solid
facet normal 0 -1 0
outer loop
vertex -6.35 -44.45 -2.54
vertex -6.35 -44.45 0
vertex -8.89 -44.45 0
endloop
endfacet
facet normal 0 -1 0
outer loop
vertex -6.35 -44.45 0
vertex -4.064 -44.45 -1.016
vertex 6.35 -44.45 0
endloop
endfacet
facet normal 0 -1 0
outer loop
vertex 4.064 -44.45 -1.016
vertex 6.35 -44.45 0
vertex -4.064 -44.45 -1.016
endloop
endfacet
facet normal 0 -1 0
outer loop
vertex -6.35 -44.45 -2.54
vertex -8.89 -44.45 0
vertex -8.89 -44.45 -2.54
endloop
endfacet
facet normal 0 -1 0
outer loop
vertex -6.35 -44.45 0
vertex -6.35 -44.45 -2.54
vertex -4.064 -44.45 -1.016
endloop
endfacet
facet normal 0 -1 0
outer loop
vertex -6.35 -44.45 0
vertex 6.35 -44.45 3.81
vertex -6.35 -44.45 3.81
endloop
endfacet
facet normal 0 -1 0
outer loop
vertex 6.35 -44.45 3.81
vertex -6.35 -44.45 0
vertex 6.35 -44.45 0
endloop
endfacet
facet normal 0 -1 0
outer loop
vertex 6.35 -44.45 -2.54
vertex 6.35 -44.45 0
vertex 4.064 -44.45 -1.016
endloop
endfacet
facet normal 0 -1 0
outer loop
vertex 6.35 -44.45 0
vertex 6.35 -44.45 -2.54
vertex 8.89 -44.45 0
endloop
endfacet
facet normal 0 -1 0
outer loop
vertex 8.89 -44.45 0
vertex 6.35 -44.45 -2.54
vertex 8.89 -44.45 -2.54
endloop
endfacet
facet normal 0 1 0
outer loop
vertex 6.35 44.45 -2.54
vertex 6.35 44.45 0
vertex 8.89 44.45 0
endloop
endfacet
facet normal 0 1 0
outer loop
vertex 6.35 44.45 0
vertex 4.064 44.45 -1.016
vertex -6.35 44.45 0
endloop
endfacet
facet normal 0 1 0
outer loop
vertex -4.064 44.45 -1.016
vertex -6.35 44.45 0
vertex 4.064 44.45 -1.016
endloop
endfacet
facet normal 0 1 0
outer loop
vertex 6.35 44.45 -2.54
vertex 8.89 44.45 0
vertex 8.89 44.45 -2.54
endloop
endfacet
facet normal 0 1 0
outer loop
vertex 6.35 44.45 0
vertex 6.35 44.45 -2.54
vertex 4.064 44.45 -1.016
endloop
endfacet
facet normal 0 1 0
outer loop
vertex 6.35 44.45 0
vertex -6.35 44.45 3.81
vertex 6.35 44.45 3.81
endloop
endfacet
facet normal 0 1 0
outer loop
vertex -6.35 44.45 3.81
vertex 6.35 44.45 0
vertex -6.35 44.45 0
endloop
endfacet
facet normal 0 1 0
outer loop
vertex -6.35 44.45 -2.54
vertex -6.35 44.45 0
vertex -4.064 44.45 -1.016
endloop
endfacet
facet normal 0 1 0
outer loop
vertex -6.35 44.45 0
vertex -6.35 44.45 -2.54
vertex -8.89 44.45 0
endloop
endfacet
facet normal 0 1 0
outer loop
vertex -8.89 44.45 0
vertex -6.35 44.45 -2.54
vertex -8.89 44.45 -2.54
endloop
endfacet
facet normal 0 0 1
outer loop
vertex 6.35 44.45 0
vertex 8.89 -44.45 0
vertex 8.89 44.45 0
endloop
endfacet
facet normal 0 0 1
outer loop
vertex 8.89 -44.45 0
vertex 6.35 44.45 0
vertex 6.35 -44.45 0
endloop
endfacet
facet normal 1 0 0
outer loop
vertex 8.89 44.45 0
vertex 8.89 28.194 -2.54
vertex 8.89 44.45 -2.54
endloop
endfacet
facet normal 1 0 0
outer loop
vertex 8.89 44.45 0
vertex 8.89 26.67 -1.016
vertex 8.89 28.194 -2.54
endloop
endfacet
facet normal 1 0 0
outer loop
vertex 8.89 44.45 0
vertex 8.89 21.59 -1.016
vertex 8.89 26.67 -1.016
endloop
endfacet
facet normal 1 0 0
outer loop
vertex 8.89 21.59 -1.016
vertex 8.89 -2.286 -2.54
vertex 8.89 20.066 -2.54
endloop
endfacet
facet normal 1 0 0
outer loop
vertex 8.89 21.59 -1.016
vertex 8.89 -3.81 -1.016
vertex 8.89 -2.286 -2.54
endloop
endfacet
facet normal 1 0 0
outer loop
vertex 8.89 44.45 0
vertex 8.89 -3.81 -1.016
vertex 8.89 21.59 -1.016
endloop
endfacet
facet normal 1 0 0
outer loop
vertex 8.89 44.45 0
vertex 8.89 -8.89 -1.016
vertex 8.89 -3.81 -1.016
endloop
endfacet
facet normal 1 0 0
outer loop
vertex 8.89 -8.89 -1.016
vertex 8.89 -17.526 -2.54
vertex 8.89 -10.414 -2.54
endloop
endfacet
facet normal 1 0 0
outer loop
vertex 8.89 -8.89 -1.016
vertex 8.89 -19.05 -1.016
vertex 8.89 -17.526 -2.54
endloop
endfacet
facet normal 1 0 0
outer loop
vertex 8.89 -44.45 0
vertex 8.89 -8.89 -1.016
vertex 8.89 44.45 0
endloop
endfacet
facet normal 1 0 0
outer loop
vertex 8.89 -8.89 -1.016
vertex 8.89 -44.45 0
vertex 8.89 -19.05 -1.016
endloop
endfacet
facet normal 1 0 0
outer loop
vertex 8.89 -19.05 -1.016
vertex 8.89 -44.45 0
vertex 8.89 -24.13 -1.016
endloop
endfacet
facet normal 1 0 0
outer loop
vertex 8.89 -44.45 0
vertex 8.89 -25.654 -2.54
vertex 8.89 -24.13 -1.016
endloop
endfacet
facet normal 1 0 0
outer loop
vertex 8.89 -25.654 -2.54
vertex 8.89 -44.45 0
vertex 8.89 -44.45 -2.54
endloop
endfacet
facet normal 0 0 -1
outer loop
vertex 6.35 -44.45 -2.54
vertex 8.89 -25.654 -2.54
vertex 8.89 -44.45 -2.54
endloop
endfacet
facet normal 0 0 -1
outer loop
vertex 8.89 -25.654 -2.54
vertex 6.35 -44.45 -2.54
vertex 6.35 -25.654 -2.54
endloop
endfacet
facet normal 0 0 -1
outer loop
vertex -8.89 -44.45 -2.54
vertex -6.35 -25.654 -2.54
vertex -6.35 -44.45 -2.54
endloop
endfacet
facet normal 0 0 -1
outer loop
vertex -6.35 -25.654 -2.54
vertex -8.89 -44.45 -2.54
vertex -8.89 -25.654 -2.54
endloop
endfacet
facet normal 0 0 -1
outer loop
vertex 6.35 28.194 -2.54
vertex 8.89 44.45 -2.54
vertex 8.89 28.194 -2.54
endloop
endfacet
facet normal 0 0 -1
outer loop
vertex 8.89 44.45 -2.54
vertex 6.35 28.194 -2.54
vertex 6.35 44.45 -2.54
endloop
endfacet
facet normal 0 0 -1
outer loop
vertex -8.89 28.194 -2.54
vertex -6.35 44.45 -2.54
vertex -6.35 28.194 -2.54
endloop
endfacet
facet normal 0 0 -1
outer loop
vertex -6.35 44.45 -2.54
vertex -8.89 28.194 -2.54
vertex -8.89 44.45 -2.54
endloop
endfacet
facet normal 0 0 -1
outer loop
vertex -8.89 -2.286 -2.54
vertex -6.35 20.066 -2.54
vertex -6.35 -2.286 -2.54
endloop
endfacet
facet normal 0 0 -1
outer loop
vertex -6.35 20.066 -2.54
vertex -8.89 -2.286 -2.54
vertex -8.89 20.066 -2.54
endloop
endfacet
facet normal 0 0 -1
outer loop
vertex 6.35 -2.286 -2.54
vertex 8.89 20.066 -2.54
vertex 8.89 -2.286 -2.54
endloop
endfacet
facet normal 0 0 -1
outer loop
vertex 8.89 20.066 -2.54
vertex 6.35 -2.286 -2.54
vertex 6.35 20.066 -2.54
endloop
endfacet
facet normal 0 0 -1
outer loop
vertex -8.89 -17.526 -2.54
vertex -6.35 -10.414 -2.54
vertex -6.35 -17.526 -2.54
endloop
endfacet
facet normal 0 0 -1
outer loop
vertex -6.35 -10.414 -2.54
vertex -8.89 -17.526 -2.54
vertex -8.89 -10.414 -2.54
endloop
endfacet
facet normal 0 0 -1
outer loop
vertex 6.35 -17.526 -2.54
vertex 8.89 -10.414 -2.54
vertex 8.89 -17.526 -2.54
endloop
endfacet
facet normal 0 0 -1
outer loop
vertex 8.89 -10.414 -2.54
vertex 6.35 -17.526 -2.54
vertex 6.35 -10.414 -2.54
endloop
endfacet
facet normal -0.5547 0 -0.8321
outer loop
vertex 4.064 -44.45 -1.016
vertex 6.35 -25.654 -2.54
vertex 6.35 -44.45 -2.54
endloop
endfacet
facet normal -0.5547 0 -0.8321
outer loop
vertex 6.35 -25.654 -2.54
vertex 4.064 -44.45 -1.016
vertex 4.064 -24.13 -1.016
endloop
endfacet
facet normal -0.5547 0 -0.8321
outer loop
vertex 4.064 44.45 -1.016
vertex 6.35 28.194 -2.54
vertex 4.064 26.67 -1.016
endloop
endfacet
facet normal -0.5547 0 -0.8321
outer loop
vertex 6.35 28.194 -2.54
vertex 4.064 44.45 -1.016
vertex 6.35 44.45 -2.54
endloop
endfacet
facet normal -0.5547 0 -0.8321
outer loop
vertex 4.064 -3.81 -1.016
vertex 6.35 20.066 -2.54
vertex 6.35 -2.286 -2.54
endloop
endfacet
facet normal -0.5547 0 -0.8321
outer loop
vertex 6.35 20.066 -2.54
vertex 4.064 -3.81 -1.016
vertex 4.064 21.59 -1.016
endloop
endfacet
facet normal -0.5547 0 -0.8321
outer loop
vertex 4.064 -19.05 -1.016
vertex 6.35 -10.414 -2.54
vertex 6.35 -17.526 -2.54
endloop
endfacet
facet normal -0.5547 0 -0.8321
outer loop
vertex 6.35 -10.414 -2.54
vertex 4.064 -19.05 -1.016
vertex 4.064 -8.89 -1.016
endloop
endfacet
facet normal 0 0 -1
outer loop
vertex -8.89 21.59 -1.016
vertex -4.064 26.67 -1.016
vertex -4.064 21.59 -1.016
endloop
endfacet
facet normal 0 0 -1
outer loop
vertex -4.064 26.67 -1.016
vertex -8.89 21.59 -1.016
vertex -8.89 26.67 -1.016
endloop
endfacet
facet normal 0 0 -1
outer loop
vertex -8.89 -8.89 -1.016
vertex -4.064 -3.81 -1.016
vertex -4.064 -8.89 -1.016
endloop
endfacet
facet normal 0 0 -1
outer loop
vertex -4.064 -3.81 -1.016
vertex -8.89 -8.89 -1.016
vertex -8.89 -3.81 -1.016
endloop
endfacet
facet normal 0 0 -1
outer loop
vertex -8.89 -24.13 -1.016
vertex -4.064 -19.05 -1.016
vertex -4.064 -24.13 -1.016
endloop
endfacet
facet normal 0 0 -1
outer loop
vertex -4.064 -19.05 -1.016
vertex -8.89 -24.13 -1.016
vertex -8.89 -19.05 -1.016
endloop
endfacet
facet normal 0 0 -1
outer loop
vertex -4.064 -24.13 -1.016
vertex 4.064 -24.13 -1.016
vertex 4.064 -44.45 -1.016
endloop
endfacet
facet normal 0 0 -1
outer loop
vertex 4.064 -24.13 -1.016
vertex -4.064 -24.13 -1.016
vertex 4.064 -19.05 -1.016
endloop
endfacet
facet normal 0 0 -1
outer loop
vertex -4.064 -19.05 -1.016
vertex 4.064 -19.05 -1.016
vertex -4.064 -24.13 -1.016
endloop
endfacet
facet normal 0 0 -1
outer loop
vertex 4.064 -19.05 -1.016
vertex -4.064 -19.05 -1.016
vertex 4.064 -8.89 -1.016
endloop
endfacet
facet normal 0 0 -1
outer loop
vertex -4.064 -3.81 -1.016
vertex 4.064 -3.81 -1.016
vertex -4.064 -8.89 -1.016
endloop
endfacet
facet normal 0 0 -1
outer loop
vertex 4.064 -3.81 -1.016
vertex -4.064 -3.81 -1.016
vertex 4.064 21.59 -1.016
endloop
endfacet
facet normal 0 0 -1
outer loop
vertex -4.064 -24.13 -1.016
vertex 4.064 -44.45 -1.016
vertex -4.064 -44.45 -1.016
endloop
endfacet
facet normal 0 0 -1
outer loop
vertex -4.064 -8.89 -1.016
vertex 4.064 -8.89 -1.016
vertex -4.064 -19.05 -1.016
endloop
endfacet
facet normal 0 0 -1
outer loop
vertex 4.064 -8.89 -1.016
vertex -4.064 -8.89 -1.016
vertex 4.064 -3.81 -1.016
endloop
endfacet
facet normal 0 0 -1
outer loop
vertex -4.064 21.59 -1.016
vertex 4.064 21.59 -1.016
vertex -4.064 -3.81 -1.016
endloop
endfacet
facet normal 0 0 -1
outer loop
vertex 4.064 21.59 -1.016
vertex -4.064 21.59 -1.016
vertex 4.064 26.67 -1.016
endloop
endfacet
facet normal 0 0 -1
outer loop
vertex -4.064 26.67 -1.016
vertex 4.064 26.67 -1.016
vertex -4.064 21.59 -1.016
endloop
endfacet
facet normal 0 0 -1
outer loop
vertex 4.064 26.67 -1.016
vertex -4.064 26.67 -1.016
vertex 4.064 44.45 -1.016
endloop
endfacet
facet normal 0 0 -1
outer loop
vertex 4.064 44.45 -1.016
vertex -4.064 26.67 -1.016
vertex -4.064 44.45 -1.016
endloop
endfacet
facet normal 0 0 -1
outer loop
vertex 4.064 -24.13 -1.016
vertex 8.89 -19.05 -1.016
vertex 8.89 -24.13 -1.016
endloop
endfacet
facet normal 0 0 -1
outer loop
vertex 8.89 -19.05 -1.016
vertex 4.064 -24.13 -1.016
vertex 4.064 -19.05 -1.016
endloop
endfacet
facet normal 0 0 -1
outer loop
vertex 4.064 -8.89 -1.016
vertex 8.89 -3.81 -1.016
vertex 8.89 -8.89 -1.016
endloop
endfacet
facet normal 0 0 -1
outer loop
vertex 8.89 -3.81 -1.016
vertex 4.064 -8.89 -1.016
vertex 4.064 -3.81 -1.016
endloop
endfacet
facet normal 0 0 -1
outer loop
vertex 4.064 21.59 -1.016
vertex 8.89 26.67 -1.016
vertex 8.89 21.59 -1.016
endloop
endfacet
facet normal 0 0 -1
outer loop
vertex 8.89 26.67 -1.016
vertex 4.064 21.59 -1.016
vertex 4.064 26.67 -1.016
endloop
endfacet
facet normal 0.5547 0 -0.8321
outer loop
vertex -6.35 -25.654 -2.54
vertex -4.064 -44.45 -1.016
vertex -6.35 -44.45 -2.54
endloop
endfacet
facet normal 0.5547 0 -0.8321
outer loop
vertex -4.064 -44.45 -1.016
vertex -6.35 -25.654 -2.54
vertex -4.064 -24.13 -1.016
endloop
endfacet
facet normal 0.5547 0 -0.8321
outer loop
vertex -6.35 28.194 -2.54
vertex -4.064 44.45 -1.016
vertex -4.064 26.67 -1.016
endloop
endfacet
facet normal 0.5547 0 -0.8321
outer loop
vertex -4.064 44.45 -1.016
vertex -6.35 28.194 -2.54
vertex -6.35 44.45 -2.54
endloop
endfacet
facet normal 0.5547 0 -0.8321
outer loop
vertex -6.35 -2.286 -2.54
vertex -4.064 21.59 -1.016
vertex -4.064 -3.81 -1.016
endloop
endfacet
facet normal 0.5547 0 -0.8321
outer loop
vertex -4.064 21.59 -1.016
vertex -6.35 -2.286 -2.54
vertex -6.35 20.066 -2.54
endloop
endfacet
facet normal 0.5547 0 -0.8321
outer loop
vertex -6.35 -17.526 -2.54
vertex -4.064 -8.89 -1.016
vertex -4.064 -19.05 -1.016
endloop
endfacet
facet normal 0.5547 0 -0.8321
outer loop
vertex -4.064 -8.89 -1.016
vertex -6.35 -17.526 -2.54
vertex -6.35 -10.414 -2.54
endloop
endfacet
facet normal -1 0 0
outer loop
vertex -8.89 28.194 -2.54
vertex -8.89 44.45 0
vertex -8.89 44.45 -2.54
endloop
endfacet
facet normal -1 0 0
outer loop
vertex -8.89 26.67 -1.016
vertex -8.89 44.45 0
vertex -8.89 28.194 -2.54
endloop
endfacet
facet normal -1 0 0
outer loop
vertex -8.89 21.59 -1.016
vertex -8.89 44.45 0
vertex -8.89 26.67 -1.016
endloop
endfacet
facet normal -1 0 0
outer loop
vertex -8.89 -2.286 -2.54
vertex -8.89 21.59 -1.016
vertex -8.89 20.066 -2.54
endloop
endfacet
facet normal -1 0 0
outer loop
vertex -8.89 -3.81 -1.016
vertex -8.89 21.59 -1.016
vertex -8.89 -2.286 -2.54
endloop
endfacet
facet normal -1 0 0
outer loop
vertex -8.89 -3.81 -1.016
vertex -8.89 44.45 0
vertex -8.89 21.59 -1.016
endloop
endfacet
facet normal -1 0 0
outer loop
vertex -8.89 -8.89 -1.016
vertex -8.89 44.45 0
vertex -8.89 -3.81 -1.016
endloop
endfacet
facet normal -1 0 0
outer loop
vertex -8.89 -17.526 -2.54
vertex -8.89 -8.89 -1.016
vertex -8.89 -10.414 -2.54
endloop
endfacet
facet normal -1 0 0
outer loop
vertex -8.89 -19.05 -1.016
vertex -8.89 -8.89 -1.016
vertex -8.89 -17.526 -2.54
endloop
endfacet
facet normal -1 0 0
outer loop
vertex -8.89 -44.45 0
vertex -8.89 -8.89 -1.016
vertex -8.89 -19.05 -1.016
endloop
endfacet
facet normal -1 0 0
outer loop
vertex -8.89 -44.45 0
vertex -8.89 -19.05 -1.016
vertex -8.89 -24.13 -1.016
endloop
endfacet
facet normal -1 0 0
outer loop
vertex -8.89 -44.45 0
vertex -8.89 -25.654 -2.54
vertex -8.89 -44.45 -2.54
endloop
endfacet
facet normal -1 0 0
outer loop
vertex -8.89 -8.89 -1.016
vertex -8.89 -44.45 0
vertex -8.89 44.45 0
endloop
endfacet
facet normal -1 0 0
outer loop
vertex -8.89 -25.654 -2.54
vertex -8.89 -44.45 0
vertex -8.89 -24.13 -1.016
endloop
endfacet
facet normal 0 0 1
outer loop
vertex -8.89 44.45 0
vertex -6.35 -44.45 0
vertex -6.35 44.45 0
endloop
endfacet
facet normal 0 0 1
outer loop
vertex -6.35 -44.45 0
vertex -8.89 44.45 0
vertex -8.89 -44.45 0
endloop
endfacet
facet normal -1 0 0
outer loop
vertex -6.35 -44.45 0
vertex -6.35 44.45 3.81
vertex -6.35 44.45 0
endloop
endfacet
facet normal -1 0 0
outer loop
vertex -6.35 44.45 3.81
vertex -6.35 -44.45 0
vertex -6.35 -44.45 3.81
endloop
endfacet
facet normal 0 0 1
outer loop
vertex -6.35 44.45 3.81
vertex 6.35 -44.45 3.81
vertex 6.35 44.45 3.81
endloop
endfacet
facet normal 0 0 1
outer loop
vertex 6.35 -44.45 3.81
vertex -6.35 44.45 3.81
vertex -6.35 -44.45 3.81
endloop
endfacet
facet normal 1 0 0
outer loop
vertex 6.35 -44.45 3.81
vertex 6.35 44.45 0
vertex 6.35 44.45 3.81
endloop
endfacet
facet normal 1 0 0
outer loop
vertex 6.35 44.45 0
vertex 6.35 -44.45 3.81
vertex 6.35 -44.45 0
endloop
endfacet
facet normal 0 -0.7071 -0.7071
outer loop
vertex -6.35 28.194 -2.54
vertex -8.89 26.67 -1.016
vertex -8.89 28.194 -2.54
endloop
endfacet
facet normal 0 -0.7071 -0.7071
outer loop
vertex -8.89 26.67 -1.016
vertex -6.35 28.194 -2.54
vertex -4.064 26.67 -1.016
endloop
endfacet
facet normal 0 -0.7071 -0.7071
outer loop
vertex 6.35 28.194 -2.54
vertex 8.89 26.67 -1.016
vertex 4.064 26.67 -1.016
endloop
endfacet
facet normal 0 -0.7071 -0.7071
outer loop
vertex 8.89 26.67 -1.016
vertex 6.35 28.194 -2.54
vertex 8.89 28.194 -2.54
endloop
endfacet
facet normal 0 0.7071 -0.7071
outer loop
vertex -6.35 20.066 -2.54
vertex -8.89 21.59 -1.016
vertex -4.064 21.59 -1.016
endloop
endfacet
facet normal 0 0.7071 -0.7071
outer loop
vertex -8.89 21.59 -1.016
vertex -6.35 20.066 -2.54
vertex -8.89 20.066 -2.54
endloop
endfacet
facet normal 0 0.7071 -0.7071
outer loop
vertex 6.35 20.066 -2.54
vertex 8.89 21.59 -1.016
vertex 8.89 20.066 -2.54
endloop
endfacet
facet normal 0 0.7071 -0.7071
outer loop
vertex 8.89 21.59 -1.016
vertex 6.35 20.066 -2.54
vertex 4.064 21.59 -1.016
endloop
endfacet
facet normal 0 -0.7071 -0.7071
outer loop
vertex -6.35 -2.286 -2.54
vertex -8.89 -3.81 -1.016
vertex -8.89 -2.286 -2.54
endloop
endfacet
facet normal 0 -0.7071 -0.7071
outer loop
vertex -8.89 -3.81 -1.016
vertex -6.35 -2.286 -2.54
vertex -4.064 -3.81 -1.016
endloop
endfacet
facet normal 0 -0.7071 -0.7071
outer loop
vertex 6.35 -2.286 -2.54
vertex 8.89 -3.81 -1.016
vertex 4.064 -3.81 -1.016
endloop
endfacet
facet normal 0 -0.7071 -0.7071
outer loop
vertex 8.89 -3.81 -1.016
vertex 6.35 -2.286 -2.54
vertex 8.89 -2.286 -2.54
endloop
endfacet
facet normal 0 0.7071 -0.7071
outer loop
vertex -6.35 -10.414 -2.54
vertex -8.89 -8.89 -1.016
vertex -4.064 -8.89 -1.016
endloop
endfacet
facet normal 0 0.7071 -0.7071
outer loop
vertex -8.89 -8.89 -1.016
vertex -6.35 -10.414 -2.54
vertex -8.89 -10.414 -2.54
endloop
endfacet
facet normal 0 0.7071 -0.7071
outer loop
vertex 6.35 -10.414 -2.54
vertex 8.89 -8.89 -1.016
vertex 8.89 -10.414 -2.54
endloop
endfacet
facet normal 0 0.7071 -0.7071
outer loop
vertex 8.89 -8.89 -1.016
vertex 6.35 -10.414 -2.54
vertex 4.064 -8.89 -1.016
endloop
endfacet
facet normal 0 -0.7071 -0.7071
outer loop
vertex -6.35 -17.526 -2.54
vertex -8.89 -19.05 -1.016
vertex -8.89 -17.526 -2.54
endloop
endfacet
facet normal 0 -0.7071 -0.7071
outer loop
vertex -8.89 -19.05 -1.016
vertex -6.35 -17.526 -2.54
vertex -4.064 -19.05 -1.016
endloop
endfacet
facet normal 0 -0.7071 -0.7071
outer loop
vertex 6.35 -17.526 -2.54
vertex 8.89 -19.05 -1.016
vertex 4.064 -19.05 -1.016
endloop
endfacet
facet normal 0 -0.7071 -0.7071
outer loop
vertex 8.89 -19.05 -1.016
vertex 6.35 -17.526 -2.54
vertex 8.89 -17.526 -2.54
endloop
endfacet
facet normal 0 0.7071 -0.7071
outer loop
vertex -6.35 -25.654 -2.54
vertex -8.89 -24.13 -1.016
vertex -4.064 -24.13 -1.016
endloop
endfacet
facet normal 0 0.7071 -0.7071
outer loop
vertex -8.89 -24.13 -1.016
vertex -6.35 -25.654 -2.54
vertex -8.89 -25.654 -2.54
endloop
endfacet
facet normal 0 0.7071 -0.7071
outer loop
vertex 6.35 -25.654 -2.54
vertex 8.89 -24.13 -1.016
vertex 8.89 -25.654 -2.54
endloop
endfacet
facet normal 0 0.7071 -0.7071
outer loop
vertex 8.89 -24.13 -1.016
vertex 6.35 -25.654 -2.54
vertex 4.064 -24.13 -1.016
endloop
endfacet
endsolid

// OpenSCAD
// file: sight_mount_side_profile.scad
// Sight Mount Side Profile
// scale 1 unit = 1 inch
render_part=1; // MaverickRev6_SideProfile()
function NerfTacticalRail_Length() = 3.5;

MaverickRev6_SightMount_SideProfile_Num_Pts=17;
module MaverickRev6_SightMount_SideProfile() {
  polygon( points=[
	[0,0], [0,0.25]
	, [0.74,0.25], [0.8,0.19], [1.0,0.19], [1.06,0.25]
	, [1.34,0.25], [1.4,0.19], [1.6,0.19], [1.66,0.25]
	, [2.54,0.25], [2.6,0.19], [2.8,0.19], [2.86,0.25]
	, [3.5, 0.25], [3.5,0], [0,0]
	]
	, paths=[ [0,1,2,3,4,5,6,7,8,9,10,11,12,13,14,15,16] ]
	, convexity=10);
}

if(render_part==1) {
  echo("Rendering MaverickRev6_SightMount_SideProfile()...");
  MaverickRev6_SightMount_SideProfile();
}
// file: sight_mount_cross_section.scad
// Points for the sight mount cross-section
// scale 1 unit = 1 inch
render_part=1; // MaverickRev6_SightMount_XSection
function NerfTacticalRail_OuterHeight() = 0.25;
function NerfTacticalRail_InnerHeight() = 0.15;
function NerfTacticalRail_OuterWidth() = 0.7;
function NerfTacticalRail_InnerWidth() = 0.5;

MaverickRev6_SightMount_XSection_Num_Pts = 15;
module MaverickRev6_SightMount_XSection() {
  polygon( points=[
	[0,0], [0.25,0], [0.25,0.15], [0.35,0.15], [0.35,0.25]
	, [0.25,0.25], [0.16,0.19]
	, [0,0.19]
	, [-0.16,0.19], [-0.25,0.25]
	, [-0.35,0.25], [-0.35,0.15], [-0.25,0.15], [-0.25,0], [0,0]
	]
	, paths=[ [0,1,2,3,4,5,6,7,8,9,10,11,12,13,14] ]
	, convexity=10);
}

if(render_part==1) {
  echo("Rendering MaverickRev6_SightMount_XSection()...");
  MaverickRev6_SightMount_XSection();
}
// main file
// Sight Mount
// scale 1 unit = 1mm
// render_part=1; // MaverickRev6_SightMount
render_part=2; // Printable MaverickRev6_SightMount

use <sight_mount_cross_section.scad>
use <sight_mount_side_profile.scad>

module MaverickRev6_SightMount() {
  intersection() {
    linear_extrude(height=25.4*NerfTacticalRail_Length(), convexity=10, center=false) scale([25.4,25.4])
	MaverickRev6_SightMount_XSection();
    translate([25.4*NerfTacticalRail_OuterWidth()/2,0,0]) rotate([0,-90,0])
      linear_extrude(height=25.4*NerfTacticalRail_OuterWidth(), convexity=10, center=false) scale([25.4,25.4])
	MaverickRev6_SightMount_SideProfile();
  }
}

if(render_part==1) {
  echo("Rendering MaverickRev6_SightMount()...");
  MaverickRev6_SightMount();
}

if(render_part==2) {
  echo("Rendering printable MaverickRev6_SightMount()...");
  translate([0,-25.4*NerfTacticalRail_Length()/2,25.4*NerfTacticalRail_InnerHeight()]) rotate([-90,0,0]) MaverickRev6_SightMount();
}
